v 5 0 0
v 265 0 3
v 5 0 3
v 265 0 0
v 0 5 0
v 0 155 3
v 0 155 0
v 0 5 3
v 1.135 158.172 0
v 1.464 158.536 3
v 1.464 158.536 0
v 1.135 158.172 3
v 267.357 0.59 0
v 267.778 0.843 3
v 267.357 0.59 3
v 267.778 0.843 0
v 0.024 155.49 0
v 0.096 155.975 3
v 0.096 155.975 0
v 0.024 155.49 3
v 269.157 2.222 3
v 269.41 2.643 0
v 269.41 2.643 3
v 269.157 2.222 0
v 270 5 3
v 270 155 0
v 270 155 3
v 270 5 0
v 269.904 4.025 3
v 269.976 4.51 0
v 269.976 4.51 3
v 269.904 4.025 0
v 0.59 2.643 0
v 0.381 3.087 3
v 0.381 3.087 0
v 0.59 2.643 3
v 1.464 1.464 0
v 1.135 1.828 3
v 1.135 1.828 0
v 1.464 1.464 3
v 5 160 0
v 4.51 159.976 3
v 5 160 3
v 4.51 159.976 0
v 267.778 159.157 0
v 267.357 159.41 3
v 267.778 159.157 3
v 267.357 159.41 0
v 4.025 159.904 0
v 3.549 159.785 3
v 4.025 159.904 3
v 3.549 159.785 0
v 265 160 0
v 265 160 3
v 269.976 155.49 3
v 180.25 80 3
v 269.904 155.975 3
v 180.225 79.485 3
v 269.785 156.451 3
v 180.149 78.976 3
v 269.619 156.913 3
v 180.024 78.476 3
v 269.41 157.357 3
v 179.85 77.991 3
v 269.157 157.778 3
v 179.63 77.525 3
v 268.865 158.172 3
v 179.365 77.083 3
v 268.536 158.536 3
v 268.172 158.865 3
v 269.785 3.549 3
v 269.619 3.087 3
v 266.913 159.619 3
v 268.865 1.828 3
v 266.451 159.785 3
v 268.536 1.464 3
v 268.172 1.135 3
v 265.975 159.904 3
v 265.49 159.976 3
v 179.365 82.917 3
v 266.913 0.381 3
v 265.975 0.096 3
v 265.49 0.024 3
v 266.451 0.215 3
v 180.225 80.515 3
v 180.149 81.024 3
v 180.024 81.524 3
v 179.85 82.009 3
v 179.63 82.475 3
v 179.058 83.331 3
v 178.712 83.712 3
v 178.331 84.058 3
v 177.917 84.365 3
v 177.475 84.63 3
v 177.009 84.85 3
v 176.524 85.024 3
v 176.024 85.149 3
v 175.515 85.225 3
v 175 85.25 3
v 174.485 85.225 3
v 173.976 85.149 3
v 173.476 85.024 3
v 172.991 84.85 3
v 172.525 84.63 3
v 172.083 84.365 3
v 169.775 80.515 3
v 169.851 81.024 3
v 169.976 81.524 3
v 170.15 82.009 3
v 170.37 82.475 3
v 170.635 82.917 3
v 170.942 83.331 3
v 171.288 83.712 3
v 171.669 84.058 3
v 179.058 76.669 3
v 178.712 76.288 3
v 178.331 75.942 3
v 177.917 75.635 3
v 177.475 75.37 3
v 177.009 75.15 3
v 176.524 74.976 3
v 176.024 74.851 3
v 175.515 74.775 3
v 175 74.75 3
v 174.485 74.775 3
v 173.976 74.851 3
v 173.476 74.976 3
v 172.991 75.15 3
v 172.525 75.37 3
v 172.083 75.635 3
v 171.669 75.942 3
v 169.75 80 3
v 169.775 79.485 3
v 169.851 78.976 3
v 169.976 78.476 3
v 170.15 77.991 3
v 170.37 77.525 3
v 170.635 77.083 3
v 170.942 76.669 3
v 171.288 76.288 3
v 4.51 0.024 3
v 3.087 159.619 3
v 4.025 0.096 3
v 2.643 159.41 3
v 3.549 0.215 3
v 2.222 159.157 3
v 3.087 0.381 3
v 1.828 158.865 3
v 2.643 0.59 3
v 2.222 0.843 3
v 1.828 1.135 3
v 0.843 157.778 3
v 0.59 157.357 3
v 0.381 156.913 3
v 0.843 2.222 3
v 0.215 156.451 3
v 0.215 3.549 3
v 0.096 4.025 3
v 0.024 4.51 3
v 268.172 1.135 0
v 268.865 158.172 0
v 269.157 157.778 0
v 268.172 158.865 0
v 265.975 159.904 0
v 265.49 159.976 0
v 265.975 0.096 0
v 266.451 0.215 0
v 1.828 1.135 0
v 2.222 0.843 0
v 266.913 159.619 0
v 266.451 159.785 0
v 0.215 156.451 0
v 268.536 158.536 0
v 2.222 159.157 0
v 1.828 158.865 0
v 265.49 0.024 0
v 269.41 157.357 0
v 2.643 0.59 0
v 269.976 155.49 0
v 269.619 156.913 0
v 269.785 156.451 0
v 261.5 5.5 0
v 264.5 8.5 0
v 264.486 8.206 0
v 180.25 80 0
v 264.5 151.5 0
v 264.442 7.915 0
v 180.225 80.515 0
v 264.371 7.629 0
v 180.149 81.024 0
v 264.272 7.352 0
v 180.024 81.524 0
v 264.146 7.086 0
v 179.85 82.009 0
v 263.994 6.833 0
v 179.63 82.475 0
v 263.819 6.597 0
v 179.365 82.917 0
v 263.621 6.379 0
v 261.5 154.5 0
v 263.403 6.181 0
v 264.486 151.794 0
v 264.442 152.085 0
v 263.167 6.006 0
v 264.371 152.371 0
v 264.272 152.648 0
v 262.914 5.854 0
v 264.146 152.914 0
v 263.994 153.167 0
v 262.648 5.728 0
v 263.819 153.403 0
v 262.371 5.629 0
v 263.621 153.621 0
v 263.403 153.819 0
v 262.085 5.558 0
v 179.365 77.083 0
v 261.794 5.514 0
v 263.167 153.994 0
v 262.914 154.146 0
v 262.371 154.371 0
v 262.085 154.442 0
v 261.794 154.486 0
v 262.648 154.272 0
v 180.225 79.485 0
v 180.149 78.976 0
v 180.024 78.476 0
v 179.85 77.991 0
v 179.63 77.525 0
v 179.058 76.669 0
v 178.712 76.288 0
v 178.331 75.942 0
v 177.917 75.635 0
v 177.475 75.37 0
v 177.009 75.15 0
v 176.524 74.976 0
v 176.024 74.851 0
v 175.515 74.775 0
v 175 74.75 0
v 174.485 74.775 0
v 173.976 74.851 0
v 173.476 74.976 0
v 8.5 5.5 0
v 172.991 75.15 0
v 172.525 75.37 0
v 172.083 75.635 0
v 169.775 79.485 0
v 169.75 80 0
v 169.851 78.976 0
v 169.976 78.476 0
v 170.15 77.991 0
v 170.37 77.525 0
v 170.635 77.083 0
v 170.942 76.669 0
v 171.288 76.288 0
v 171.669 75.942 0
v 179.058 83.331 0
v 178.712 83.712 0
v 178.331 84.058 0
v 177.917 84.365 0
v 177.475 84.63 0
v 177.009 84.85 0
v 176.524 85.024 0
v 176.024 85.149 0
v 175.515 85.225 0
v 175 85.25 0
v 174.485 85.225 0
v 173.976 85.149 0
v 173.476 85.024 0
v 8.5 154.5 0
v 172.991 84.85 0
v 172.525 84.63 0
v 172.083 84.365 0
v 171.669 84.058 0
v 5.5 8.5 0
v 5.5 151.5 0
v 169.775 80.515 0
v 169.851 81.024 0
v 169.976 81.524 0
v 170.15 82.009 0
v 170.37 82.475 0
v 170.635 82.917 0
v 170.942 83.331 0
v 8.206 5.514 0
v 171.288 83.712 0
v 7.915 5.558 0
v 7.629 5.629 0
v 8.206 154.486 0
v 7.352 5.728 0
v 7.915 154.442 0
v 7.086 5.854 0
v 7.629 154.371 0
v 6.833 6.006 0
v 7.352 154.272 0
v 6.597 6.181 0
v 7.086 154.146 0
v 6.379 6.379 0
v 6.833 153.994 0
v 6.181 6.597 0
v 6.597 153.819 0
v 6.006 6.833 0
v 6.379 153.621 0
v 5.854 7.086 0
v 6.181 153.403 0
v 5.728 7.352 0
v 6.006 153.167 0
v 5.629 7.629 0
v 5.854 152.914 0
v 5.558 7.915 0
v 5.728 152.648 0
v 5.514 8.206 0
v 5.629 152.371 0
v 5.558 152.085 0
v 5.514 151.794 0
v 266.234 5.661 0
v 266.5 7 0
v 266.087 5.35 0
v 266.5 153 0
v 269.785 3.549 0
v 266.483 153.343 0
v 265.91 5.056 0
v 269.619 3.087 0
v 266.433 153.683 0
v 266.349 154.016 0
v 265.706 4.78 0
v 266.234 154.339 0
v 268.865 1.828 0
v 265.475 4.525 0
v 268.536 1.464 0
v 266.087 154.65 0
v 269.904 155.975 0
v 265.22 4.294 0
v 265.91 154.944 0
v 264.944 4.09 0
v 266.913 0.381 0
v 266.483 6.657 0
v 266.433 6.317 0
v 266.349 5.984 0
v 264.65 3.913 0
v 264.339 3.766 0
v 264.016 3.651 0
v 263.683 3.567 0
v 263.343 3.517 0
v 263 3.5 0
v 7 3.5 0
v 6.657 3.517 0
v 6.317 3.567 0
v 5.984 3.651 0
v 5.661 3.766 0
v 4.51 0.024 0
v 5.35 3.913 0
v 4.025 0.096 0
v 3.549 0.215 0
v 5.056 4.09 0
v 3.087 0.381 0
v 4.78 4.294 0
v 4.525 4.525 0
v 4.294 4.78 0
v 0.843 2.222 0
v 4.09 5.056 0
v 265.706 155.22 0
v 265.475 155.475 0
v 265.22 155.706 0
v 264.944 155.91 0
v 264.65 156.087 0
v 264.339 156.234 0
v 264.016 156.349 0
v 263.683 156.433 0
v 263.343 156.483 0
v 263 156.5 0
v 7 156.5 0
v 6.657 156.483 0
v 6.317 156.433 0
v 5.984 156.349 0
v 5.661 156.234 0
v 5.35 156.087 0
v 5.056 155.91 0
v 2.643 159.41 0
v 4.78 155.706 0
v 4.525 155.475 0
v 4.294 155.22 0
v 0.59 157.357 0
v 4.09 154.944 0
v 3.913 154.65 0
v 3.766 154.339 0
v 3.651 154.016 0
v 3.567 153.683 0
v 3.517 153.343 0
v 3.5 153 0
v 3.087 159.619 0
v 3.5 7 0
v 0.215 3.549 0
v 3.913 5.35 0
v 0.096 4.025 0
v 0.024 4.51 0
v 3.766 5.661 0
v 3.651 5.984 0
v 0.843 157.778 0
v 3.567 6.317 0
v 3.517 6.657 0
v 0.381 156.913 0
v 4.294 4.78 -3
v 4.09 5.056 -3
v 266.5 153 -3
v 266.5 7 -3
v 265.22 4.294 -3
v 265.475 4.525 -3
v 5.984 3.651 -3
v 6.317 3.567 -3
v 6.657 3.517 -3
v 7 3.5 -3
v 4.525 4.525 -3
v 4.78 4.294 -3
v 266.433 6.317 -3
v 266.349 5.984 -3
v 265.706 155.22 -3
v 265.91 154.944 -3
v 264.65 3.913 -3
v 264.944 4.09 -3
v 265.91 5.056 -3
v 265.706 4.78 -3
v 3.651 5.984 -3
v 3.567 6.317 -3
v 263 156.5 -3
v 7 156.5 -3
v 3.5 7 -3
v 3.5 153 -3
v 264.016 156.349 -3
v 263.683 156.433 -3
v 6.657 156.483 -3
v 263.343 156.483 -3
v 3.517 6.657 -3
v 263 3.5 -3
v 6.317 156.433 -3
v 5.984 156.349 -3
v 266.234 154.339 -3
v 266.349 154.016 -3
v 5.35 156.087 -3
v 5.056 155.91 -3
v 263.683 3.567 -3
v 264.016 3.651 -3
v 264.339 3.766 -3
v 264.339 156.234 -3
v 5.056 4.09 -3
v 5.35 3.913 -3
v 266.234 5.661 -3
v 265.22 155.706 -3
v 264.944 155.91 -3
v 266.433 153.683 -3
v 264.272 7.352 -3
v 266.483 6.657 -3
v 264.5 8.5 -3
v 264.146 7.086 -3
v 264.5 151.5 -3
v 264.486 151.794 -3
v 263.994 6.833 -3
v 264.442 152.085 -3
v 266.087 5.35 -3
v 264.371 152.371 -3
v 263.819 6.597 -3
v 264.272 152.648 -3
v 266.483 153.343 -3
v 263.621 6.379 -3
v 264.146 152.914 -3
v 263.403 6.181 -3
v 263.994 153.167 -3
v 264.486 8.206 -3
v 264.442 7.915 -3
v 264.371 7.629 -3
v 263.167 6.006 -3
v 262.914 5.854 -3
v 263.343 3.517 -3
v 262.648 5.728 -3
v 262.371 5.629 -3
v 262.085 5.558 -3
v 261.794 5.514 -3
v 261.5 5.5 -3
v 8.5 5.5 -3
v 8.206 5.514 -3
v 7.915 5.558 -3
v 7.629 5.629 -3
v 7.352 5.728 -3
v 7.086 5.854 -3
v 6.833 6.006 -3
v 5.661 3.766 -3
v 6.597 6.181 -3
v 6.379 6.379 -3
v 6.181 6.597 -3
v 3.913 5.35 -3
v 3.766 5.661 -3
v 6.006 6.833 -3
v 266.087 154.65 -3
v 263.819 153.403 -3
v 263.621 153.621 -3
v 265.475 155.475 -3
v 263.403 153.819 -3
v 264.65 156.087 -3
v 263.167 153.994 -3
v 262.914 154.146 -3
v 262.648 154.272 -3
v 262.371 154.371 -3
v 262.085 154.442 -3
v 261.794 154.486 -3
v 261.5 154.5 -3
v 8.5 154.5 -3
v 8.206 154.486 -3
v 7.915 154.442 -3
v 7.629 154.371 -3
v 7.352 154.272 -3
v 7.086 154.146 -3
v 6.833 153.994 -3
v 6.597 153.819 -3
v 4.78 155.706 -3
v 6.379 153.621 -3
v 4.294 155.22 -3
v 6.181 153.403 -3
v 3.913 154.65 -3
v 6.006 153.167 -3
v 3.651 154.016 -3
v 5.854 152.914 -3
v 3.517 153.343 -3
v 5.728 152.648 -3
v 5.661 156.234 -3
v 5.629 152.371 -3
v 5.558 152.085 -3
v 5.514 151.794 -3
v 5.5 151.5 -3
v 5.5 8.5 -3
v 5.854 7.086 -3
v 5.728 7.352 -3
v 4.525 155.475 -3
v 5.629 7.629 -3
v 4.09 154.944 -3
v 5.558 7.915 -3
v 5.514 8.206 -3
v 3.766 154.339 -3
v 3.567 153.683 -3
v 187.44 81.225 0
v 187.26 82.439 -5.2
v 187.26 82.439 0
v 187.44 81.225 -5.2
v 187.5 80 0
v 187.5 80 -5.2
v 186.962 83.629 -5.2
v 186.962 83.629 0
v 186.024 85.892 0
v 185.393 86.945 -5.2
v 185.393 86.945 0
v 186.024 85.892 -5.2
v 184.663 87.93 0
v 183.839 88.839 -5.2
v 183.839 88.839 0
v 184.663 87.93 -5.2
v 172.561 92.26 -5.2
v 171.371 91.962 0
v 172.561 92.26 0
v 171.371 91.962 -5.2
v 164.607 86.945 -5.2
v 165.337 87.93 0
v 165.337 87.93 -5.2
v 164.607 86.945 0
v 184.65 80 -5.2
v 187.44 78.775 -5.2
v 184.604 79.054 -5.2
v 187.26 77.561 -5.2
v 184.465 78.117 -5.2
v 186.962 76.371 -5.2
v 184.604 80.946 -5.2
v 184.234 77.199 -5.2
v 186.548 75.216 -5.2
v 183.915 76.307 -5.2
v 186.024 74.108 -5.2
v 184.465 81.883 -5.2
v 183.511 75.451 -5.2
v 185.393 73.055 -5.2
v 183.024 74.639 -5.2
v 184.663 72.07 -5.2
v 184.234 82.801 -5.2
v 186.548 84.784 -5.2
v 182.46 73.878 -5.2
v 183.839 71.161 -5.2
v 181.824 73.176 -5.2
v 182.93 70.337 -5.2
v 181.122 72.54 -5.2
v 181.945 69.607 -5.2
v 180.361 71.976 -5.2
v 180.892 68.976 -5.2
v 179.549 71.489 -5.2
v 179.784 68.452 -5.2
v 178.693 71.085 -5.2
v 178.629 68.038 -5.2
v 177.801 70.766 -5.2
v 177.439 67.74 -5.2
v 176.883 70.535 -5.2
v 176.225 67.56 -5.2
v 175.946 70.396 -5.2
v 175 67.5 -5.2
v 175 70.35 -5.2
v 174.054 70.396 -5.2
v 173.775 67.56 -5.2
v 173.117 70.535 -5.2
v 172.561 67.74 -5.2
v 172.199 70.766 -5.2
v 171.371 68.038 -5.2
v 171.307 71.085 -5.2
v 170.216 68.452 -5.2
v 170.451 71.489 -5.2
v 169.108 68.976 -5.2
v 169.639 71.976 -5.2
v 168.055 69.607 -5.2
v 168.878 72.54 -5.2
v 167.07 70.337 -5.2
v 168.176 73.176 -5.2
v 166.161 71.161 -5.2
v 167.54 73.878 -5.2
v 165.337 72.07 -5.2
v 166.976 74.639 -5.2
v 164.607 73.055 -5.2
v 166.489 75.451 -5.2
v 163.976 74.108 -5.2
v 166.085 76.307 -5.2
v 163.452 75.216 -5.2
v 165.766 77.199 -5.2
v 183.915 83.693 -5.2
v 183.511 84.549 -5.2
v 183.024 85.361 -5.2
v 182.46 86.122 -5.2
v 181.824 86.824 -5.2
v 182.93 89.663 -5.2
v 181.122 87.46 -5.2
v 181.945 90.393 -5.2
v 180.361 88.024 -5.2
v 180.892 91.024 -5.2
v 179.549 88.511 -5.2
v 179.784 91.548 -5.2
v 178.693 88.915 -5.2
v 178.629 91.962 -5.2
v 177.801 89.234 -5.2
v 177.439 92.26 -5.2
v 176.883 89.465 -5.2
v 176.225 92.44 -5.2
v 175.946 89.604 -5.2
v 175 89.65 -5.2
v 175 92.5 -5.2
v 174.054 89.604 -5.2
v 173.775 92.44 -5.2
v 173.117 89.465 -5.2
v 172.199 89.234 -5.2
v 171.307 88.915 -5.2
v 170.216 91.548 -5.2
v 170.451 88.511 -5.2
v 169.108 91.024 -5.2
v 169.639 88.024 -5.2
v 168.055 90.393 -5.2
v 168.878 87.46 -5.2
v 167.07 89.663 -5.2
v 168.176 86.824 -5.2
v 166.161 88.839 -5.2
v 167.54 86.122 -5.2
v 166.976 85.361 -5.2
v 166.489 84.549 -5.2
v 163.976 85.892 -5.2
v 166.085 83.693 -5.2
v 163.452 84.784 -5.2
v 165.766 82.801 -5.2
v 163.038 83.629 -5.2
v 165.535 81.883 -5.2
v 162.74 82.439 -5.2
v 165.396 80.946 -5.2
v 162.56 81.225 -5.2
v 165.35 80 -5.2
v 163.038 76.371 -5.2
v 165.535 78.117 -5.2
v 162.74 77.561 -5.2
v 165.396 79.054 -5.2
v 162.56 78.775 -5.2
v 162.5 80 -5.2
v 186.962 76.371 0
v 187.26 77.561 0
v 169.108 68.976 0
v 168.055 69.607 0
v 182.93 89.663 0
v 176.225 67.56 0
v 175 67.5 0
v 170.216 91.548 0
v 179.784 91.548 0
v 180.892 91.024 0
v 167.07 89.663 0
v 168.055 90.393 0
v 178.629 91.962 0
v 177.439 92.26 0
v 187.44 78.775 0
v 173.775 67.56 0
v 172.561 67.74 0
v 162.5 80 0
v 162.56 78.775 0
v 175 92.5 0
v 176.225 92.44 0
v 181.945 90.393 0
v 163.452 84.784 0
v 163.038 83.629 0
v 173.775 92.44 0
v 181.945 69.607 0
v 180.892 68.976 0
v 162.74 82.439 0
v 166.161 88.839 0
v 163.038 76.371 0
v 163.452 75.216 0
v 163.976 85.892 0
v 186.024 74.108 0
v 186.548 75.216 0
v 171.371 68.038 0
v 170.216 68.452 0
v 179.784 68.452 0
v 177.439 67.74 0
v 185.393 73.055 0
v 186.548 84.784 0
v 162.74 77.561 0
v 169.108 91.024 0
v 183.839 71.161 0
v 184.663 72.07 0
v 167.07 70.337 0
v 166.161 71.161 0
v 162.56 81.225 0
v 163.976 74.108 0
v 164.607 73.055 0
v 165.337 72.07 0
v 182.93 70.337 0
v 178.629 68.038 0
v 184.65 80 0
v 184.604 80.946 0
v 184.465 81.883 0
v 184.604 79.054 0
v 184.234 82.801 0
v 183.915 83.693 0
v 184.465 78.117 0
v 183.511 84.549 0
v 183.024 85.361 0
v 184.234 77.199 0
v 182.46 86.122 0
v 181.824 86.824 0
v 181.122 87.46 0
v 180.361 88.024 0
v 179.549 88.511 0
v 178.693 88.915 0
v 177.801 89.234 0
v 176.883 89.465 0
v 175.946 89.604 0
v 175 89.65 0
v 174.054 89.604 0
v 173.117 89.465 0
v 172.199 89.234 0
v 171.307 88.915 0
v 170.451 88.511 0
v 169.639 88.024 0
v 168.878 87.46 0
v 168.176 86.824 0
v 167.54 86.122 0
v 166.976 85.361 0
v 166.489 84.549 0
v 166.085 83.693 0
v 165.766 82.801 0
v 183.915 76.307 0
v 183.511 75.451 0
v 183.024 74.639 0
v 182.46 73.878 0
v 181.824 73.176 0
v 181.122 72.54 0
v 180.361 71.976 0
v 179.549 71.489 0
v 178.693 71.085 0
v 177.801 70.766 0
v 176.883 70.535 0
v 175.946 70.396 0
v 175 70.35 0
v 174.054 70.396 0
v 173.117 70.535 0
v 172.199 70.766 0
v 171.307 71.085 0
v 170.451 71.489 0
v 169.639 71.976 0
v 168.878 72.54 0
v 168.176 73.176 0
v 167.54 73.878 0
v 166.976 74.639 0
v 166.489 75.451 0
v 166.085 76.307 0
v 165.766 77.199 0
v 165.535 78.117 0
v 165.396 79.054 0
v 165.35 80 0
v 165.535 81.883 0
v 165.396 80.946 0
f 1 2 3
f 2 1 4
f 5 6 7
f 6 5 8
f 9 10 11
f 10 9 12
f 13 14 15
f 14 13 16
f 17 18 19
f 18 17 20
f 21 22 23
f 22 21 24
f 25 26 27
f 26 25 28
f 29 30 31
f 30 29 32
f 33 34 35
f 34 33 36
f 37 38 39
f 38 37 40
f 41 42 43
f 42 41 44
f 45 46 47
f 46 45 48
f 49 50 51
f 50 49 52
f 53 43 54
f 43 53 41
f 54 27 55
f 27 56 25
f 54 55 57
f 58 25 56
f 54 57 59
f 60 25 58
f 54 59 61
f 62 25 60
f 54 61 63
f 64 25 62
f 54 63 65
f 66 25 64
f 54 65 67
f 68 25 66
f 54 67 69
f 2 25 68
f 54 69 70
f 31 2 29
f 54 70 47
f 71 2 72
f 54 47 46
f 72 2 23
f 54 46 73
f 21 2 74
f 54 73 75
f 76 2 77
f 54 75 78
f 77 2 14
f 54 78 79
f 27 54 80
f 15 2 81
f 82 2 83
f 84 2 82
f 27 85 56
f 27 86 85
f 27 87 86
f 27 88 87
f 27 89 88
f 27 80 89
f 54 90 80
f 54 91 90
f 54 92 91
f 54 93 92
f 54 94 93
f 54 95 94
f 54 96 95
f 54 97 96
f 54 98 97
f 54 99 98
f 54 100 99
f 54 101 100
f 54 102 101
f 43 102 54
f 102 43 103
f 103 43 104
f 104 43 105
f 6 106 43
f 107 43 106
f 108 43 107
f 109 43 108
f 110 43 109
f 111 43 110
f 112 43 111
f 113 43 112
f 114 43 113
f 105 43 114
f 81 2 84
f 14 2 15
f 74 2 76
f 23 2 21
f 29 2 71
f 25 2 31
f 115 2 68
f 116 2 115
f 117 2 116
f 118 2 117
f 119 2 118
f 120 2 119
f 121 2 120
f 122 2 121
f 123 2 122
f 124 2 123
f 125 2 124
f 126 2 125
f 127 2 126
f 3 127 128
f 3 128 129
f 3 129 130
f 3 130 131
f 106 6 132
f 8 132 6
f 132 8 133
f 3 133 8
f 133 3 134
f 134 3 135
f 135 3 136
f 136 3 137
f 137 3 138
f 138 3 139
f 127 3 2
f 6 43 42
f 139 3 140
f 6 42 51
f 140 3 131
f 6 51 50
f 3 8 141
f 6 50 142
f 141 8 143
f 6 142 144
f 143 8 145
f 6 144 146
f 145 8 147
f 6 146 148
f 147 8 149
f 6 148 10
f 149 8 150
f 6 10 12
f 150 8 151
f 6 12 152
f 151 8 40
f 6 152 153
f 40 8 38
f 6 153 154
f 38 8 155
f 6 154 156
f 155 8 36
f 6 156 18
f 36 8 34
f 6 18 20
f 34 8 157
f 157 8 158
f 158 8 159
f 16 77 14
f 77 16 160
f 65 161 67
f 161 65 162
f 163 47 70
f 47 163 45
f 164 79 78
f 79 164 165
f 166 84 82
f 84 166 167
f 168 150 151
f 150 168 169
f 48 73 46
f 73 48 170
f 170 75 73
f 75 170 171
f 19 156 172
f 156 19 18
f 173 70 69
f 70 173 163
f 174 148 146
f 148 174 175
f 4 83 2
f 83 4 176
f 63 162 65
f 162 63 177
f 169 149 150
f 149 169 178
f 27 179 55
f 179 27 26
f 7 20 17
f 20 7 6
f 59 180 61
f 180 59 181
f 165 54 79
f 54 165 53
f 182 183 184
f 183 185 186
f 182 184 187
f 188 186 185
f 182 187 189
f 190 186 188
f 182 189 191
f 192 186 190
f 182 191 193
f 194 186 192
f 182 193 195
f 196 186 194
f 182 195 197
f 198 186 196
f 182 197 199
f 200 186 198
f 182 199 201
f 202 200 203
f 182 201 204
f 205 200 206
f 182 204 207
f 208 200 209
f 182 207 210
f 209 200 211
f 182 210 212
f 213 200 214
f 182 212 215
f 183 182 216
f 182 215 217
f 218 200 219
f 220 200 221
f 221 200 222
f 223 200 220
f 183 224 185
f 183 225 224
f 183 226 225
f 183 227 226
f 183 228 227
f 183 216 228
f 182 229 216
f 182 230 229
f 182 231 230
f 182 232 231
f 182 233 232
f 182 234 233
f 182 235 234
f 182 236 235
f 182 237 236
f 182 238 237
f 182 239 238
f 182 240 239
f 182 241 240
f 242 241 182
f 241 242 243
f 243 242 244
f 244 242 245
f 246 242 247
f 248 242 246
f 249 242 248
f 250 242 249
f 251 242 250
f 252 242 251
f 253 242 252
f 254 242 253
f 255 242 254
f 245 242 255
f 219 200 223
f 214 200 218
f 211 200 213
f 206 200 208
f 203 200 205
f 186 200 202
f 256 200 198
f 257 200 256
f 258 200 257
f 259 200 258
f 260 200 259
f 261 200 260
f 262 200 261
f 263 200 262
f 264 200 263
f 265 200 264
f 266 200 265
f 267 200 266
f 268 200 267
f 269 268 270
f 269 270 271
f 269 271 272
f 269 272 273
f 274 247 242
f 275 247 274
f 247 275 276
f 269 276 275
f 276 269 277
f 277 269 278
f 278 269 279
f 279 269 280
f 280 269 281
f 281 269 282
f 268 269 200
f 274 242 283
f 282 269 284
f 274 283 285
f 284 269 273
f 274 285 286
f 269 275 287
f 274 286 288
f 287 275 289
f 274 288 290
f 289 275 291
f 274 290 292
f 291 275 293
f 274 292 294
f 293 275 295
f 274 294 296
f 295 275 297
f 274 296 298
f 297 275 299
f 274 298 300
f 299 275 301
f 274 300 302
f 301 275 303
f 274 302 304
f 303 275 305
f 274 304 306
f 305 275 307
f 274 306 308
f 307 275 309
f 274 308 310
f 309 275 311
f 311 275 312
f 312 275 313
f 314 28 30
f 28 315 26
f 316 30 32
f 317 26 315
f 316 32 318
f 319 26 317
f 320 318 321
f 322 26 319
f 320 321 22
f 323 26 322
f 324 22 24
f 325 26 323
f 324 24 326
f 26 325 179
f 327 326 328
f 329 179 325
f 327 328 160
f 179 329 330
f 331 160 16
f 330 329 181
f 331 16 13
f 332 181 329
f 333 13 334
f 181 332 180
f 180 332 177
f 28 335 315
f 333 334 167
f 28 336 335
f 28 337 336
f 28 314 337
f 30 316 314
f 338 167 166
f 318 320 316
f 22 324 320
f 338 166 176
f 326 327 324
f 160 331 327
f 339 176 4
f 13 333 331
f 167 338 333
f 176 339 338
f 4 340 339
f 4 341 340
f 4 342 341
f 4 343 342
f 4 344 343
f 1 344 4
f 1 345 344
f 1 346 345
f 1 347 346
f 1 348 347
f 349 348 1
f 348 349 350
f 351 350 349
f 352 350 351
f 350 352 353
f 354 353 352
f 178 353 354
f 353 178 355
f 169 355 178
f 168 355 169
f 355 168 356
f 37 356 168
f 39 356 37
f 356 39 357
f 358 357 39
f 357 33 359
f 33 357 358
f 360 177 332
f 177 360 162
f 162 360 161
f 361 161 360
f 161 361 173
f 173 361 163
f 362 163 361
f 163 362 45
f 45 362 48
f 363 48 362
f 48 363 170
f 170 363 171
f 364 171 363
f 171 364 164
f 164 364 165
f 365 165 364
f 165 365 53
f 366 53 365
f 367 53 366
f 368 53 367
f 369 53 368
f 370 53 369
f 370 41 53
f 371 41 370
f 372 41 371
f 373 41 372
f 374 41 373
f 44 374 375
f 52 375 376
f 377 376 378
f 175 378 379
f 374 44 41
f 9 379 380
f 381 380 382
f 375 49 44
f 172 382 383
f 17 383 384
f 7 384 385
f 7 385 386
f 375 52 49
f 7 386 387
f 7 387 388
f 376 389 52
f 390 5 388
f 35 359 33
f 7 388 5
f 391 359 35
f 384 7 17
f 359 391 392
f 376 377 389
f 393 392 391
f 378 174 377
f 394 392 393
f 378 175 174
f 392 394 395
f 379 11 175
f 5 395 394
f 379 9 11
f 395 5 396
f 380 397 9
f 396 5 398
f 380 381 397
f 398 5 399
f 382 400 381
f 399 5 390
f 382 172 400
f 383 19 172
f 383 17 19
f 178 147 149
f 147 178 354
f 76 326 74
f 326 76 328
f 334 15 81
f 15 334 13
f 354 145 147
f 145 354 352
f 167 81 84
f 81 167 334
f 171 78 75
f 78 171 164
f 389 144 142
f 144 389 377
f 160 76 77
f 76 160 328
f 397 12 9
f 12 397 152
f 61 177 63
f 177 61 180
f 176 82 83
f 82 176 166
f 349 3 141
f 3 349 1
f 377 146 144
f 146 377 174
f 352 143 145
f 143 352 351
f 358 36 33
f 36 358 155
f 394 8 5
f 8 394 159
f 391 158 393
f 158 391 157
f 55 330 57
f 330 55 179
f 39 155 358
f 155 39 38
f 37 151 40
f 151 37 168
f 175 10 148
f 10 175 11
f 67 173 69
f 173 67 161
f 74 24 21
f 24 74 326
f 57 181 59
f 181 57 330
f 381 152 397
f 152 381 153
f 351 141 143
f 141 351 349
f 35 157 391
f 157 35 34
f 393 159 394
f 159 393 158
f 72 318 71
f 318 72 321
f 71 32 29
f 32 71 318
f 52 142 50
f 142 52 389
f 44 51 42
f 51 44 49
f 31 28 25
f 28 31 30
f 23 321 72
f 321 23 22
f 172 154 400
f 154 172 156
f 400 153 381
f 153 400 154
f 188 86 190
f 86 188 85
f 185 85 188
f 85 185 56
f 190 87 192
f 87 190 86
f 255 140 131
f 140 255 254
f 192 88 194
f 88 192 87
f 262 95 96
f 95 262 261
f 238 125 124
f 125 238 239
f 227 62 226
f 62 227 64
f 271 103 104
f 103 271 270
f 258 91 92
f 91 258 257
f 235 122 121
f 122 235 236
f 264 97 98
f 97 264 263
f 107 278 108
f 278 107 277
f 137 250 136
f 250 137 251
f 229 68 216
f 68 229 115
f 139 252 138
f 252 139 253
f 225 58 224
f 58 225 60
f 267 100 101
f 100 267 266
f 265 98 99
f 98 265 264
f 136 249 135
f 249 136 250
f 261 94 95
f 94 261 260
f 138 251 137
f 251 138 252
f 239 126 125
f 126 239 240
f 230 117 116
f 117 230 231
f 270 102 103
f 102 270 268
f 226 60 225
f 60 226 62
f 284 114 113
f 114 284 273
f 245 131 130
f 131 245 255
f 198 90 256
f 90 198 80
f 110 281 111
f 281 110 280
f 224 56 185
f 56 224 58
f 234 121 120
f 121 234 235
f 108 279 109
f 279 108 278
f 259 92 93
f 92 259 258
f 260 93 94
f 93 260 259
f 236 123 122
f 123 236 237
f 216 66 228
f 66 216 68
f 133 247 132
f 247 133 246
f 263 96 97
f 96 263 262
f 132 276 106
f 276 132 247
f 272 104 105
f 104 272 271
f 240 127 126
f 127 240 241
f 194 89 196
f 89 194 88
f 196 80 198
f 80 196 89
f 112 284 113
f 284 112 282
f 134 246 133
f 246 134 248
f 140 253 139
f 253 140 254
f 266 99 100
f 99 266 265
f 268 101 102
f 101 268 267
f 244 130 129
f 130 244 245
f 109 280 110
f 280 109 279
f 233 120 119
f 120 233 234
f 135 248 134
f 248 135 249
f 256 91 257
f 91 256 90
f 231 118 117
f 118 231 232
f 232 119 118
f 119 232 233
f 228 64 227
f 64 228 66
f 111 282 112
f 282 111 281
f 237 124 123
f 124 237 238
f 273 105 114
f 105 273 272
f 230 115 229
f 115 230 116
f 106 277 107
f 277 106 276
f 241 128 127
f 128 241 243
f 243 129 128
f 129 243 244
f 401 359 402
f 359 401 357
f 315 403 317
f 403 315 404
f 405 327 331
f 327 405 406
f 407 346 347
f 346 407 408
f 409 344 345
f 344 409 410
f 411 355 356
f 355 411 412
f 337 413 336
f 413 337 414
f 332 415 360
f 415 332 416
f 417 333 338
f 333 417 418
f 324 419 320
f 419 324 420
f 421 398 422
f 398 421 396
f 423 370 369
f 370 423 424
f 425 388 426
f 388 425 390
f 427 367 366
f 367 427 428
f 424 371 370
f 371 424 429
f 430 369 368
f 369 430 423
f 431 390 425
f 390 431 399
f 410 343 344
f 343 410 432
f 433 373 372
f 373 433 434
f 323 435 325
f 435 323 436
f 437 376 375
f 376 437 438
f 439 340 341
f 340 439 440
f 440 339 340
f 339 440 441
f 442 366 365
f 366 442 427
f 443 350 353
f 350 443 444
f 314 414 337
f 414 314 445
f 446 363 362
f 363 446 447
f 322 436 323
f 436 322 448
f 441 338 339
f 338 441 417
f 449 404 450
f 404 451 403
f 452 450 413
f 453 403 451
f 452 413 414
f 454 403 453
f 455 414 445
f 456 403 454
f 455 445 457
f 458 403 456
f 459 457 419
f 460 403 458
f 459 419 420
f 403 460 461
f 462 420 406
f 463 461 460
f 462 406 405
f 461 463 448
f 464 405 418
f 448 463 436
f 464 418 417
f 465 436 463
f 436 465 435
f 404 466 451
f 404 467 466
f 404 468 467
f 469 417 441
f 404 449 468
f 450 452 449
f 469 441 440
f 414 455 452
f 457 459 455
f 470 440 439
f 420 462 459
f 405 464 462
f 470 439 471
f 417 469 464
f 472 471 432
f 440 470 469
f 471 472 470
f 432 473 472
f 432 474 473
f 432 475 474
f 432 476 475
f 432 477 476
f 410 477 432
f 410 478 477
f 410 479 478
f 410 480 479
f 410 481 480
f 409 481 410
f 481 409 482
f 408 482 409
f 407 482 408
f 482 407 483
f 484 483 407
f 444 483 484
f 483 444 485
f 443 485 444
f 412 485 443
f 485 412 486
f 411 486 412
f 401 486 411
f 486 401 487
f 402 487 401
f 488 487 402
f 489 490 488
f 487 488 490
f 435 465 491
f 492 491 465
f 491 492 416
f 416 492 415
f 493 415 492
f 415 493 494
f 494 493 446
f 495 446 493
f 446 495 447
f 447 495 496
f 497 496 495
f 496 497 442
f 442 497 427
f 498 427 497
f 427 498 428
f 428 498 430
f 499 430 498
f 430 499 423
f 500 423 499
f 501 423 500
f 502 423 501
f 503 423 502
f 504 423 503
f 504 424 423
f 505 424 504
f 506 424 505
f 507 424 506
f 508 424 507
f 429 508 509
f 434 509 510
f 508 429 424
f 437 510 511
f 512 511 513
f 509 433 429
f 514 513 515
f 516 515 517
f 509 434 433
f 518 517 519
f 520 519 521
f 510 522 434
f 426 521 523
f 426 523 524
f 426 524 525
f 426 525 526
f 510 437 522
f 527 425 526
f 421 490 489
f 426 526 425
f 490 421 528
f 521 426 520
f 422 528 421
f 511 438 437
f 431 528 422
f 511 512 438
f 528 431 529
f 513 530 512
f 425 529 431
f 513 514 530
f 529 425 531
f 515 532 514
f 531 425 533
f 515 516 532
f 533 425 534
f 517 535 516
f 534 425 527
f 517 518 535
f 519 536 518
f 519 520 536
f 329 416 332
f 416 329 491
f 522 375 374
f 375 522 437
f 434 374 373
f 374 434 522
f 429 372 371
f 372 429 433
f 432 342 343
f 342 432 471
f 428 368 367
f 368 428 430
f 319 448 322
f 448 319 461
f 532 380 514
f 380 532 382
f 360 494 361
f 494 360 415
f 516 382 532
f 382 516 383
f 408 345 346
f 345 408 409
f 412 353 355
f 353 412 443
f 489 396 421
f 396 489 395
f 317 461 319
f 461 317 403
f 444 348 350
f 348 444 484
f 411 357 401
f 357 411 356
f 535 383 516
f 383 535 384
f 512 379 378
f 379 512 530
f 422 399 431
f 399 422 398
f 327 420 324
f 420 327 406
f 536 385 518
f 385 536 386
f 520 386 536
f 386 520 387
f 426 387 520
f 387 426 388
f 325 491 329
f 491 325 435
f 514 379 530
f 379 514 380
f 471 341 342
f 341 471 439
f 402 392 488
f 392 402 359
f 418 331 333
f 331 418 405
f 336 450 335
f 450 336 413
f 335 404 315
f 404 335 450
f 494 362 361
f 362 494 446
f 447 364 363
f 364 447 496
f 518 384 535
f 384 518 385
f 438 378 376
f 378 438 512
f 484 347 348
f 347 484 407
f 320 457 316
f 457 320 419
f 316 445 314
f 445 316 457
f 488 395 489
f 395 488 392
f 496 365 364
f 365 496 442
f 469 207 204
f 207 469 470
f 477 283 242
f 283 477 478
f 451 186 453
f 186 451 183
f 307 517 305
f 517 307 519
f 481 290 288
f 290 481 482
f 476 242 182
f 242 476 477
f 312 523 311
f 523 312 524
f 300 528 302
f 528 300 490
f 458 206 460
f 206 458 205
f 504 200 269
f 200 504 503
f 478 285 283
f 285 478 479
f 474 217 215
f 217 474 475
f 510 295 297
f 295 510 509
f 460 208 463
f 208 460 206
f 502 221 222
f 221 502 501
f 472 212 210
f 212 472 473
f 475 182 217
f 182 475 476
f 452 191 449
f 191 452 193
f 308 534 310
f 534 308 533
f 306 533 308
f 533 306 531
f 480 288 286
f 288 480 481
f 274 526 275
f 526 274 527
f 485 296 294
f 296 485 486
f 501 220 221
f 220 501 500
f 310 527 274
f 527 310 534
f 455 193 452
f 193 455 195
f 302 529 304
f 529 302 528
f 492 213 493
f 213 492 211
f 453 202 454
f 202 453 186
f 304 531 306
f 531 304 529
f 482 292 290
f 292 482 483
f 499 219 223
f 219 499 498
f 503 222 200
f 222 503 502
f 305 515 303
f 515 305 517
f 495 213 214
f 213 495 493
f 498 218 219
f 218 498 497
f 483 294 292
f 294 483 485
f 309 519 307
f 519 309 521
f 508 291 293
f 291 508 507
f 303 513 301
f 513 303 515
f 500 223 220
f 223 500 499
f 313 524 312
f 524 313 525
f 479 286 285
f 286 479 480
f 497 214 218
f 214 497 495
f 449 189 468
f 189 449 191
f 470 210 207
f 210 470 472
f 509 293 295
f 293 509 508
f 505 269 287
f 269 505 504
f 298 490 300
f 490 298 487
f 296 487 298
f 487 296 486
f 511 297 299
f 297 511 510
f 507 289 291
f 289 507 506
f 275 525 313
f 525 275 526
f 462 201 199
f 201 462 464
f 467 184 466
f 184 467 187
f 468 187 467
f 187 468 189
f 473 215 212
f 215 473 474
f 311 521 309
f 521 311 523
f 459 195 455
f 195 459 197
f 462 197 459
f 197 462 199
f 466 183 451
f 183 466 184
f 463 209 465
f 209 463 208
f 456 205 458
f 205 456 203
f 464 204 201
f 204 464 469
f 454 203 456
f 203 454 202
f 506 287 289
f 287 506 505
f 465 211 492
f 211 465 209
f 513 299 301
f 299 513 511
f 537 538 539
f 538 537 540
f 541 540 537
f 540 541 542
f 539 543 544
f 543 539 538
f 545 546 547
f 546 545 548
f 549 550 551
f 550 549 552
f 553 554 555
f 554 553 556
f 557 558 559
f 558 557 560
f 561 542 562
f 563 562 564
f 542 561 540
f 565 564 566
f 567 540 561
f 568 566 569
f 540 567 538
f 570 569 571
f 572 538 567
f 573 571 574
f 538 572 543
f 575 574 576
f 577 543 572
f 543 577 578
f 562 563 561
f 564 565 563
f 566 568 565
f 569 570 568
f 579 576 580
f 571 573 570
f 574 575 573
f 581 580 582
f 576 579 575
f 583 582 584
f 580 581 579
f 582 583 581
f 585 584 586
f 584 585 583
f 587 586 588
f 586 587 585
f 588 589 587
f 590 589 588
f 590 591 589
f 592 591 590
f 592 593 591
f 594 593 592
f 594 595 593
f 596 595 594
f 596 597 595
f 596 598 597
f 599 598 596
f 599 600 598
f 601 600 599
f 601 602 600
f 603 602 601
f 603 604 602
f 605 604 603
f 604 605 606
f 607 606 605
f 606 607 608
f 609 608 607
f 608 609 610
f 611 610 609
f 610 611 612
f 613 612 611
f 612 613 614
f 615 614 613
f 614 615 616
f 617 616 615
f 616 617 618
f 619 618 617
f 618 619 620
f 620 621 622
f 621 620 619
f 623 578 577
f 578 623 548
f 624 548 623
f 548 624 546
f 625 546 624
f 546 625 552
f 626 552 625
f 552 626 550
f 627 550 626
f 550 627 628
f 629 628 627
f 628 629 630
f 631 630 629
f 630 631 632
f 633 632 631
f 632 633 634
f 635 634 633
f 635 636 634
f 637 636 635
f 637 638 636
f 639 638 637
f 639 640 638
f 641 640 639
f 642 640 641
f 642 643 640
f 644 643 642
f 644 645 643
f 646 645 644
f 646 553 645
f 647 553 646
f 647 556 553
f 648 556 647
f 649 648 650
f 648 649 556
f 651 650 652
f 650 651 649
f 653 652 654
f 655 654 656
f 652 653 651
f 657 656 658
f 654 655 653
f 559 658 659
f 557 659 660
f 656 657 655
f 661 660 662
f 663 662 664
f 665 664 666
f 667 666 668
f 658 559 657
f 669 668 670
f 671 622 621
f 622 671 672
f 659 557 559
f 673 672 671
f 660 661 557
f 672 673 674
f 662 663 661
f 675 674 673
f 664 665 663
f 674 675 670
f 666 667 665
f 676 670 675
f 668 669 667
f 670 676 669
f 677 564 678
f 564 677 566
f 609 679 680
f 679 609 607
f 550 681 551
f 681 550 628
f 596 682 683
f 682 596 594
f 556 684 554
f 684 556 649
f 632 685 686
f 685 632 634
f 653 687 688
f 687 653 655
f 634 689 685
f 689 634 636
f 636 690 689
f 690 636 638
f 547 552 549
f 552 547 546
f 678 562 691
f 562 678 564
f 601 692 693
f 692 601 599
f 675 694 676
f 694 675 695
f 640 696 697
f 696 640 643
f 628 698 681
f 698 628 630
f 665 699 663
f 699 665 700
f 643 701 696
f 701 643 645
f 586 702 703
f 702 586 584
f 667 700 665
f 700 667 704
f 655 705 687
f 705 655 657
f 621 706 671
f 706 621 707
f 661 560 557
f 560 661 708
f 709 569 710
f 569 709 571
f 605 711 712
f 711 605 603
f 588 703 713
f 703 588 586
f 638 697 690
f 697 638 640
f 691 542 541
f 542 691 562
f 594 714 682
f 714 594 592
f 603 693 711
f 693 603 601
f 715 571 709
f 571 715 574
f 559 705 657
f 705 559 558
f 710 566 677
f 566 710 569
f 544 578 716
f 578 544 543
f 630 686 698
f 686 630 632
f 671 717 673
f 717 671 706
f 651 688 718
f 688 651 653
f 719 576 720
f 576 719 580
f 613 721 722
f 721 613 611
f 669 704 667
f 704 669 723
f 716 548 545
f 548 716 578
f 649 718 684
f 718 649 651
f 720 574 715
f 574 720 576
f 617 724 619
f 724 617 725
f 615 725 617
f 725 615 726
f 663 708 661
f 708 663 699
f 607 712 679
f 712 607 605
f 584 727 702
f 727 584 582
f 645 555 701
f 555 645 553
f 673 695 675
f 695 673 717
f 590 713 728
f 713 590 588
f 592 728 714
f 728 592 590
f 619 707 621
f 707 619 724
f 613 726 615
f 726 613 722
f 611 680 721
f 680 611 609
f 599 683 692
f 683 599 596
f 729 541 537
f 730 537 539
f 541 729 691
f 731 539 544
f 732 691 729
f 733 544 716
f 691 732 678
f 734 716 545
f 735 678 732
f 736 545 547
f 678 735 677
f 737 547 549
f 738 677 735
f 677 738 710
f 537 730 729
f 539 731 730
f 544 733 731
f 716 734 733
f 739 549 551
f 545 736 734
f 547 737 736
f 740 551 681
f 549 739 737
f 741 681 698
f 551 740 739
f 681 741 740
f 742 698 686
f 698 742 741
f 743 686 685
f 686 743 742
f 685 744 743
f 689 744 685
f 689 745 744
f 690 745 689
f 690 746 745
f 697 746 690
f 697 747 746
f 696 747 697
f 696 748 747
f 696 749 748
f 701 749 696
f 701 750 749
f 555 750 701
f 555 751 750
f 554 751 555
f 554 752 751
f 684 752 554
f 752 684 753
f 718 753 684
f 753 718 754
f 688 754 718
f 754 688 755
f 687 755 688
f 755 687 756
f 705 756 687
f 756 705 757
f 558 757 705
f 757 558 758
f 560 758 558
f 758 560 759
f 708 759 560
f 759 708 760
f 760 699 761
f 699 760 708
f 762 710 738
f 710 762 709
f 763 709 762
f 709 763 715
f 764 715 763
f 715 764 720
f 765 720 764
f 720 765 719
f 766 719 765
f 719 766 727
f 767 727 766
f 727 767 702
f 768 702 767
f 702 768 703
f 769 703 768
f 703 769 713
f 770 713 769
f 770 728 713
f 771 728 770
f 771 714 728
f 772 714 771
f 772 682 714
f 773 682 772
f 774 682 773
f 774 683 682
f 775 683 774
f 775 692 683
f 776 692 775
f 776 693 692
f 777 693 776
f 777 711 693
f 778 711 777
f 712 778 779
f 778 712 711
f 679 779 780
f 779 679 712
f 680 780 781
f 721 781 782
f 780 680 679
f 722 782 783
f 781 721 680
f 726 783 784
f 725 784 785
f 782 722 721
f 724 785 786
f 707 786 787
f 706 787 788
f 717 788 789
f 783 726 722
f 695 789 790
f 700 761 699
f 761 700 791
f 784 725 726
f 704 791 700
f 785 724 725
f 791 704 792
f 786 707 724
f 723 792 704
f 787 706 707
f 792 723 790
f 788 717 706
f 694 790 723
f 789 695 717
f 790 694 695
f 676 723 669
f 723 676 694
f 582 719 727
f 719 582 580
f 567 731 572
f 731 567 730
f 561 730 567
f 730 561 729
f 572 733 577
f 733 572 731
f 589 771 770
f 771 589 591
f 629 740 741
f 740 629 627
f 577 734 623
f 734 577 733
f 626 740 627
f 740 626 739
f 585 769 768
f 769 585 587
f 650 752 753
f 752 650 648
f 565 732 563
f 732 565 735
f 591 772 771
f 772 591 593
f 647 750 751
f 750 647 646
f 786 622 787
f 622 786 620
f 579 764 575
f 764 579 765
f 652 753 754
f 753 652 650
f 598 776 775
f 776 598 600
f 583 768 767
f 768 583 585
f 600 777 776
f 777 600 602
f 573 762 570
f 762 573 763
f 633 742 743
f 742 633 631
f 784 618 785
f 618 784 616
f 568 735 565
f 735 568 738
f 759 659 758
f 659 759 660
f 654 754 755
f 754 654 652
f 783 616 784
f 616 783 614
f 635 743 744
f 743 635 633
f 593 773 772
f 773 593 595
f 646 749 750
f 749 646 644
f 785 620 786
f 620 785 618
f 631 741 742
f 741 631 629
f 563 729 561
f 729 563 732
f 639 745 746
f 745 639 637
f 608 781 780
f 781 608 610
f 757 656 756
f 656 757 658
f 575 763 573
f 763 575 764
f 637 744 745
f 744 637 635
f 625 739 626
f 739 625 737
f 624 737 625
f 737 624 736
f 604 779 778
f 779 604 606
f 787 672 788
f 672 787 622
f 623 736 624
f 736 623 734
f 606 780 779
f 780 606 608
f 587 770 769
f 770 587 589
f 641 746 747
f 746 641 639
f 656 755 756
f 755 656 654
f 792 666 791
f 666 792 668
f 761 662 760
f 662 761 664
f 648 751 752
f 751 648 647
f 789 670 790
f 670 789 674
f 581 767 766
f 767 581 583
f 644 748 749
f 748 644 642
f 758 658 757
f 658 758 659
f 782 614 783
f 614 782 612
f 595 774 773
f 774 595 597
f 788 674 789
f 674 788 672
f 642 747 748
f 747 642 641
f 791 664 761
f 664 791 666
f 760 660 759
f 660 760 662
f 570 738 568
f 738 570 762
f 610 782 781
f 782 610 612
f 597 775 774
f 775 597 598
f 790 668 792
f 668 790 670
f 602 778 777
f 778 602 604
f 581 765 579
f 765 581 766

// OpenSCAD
// FILE: Calibrated_Lid_V11.9.scad
// UPDATED: Width = 270mm, Mech_Center = 175
// TOLERANCE: Bearing hub adjusted for 0.3mm shrink.

$fn = 64;
wall = 3;
box_w = 270; // UPDATED: Matches 27cm Chassis
box_d = 160; 
corner_r = 5;
mech_center = [175, 80, wall]; // UPDATED: Re-aligned to center

union() {
    // 1. MAIN LID SURFACE
    difference() {
        color("Ivory", 0.8) rounded_block(box_w, box_d, wall, corner_r);
        // Central hole for the antenna mast shaft
        translate([mech_center[0], mech_center[1], -1]) cylinder(h=wall+2, d=10.5);
    }

    // 2. LOCKING INSET RIM
    // This rim drops into the box to prevent the lid from sliding.
    // 0.5mm clearance added to the perimeter for easier fit.
    translate([wall + 0.5, wall + 0.5, -wall])
    difference() {
        rounded_block(box_w - wall*2 - 1, box_d - wall*2 - 1, wall, corner_r - 1.5);
        translate([2, 2, -1]) rounded_block(box_w - wall*2 - 5, box_d - wall*2 - 5, wall + 2, corner_r - 2);
        // Clearance for the central mechanical zone
        translate([mech_center[0]-50, mech_center[1]-50, -1]) cube([100, 100, wall+2]);
    }

    // 3. UPPER BEARING HUB
    // Seated against the lid to support the top of the rotating rod.
    translate([mech_center[0], mech_center[1], -5.2])
        difference() {
            cylinder(h=5.2, d=25);
            // CALIBRATED: 19.3mm for a 19mm bearing
            translate([0,0,-0.1]) cylinder(h=5.4, d=19.3); 
        }
}

// --- UTILITIES ---
module rounded_block(w, d, h, r) {
    hull() {
        translate([r, r, 0]) cylinder(h=h, r=r);
        translate([w-r, r, 0]) cylinder(h=h, r=r);
        translate([w-r, d-r, 0]) cylinder(h=h, r=r);
        translate([r, d-r, 0]) cylinder(h=h, r=r);
    }
}
